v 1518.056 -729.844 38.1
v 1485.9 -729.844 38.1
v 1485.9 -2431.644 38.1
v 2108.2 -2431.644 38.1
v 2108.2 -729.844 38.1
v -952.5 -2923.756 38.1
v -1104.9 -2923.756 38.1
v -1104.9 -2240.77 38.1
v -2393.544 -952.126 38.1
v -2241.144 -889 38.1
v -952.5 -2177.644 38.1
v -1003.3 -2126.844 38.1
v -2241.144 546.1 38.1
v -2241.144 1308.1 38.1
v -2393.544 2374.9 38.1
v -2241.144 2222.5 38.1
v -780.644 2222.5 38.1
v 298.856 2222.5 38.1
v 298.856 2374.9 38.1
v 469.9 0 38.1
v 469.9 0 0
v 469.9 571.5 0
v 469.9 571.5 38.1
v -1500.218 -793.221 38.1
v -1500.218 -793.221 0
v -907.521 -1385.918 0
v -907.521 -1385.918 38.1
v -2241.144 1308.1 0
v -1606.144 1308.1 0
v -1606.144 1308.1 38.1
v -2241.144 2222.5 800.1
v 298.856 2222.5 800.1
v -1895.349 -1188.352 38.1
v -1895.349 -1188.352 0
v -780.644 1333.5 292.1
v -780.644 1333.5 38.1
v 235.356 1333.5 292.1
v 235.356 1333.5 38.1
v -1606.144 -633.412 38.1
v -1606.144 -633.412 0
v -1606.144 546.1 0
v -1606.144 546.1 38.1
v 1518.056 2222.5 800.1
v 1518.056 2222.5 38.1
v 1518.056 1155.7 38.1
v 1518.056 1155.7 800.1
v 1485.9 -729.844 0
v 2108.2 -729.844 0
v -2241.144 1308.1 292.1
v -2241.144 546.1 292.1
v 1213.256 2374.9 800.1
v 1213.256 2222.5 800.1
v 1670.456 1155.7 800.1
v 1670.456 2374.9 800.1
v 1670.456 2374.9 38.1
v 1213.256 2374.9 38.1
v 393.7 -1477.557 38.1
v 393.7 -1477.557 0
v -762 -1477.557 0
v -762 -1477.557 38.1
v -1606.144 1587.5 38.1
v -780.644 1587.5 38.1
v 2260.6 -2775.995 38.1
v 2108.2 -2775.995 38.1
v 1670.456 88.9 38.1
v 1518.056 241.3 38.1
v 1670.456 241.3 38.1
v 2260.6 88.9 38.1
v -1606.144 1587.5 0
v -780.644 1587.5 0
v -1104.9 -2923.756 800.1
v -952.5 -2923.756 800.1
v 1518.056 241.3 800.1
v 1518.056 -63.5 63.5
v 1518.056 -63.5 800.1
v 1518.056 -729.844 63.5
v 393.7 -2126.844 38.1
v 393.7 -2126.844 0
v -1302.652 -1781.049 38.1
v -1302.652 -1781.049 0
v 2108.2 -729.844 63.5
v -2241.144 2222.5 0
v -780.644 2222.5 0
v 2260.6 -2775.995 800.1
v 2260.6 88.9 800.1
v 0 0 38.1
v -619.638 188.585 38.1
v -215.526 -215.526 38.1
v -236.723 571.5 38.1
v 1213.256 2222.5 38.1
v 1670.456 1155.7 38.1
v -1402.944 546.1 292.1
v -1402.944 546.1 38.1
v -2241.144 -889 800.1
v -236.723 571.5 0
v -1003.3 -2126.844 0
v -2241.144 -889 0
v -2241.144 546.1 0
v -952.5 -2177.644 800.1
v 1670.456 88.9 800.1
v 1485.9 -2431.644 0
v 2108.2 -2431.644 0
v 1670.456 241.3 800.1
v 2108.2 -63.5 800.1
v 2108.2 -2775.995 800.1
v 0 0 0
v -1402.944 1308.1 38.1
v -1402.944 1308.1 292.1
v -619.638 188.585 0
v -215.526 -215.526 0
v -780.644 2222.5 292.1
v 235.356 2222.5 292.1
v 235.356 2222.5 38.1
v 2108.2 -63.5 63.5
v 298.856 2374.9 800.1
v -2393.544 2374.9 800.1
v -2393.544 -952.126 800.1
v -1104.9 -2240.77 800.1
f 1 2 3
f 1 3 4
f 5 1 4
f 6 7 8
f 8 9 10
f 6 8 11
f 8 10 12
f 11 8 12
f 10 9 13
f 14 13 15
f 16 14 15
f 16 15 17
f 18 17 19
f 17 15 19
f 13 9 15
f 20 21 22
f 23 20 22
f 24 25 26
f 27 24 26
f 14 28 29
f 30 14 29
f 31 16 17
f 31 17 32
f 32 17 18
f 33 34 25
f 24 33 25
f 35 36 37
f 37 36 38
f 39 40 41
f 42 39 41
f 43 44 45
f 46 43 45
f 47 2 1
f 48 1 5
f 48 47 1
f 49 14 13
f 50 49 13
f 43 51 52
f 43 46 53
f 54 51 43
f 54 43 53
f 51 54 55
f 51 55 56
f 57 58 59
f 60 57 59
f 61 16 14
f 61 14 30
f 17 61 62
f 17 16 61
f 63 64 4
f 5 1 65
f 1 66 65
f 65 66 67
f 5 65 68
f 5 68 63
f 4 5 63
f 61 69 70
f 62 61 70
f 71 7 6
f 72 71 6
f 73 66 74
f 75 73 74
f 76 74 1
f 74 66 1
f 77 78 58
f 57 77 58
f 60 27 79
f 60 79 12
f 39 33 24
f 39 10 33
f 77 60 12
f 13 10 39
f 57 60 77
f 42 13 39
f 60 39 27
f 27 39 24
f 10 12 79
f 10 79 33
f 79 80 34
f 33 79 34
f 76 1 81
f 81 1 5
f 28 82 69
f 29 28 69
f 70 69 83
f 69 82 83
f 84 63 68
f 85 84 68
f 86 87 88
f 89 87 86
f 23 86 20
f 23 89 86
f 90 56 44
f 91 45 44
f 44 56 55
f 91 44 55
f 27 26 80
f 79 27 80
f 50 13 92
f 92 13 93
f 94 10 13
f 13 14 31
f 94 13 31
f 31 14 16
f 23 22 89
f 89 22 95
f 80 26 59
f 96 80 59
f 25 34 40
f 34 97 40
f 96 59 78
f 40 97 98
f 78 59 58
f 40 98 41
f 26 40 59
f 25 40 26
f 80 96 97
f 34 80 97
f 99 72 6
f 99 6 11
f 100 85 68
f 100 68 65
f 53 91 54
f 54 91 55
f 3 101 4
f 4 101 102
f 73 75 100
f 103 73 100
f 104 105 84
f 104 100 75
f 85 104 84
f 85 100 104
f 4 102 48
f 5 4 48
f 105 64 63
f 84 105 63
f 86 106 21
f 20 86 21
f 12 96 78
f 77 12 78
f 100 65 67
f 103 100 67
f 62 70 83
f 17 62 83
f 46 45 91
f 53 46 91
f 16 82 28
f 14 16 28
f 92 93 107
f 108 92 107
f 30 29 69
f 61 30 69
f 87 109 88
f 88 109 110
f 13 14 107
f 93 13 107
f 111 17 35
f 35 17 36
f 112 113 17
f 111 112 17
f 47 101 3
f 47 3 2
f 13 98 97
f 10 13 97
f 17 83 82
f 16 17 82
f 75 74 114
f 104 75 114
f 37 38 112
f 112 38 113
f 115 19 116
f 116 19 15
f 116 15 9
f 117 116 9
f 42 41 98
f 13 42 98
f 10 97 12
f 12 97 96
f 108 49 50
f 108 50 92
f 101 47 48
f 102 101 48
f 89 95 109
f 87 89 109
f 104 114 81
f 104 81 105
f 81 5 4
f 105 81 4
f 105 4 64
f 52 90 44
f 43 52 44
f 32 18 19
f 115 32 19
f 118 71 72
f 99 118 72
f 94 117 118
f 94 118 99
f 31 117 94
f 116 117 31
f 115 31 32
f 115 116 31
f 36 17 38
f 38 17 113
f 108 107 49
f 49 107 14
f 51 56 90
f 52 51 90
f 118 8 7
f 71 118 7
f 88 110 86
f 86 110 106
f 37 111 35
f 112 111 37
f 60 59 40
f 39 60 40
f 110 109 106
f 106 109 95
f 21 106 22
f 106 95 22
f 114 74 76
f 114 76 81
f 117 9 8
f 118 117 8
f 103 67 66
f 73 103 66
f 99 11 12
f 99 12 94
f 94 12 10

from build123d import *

# Parameters (mm, degrees)
F0_W     = 622.3
F0_H     = 1701.8
F1_DEPTH = 38.1
F3_DEPTH = 254
F5_DEPTH = 762
F6_DEPTH = 25.4


with BuildPart() as f1:
    # F0 (on Top) → F1 (new body)
    with BuildSketch(Plane.XY):
        Polygon((-215.526147, -215.526147), (0, 0), (469.9, 0), (469.9, 571.5), (-236.723051, 571.5), (-619.637672, 188.585379), align=None)
        with Locations((1797.05, -1580.744075)):
            Rectangle(F0_W, F0_H)
        Polygon((-2241.144075, 2222.5), (-2241.144075, 1308.1), (-1606.144075, 1308.1), (-1606.144075, 1587.5), (-780.644075, 1587.5), (-780.644075, 2222.5), align=None)
        Polygon((-1003.3, -2126.844075), (393.7, -2126.844075), (393.7, -1477.556575), (-762, -1477.556575), (-1606.144075, -633.4125), (-1606.144075, 546.1), (-2241.144075, 546.1), (-2241.144075, -889), align=None)
        Polygon((-1895.348777, -1188.351873), (-1500.217508, -793.220604), (-907.520604, -1385.917508), (-1302.651873, -1781.048777), align=None, mode=Mode.SUBTRACT)
    extrude(amount=F1_DEPTH)



with BuildPart() as f3:
    # F2 (on face) → F3 (new body)
    with BuildSketch(Plane.XY.offset(38.1)):
        Polygon((235.355925, 2222.5), (-780.644075, 2222.5), (-780.644075, 1587.5), (-780.644075, 1333.5), (235.355925, 1333.5), align=None)
        Polygon((-1606.144075, 1308.1), (-2241.144075, 1308.1), (-2241.144075, 546.1), (-1606.144075, 546.1), (-1402.944075, 546.1), (-1402.944075, 1308.1), align=None)
    extrude(amount=F3_DEPTH)


with BuildPart() as f5:
    # F4 (on face) → F5 (new body)
    with BuildSketch(Plane.XY.offset(38.1)):
        Polygon((-2241.144075, 1308.1), (-2241.144075, 2222.5), (-780.644075, 2222.5), (298.855925, 2222.5), (298.855925, 2374.9), (-2393.544075, 2374.9), (-2393.544075, -952.126147), (-1104.9, -2240.770222), (-1104.9, -2923.756123), (-952.5, -2923.756123), (-952.5, -2177.644075), (-2241.144075, -889), (-2241.144075, 546.1), align=None)
        Polygon((2108.2, -63.5), (2108.2, -425.044075), (2108.2, -729.844075), (2108.2, -2775.994823), (2260.6, -2775.994823), (2260.6, 88.9), (1670.455925, 88.9), (1670.455925, 241.3), (1518.055925, 241.3), (1518.055925, -63.5), align=None)
        Polygon((1670.455925, 2374.9), (1213.255925, 2374.9), (1213.255925, 2222.5), (1518.055925, 2222.5), (1518.055925, 1155.7), (1670.455925, 1155.7), align=None)
    extrude(amount=F5_DEPTH)


with BuildPart() as f1_1:
    add(f1.part)

    add(f5.part)  # F6 merges F5
    # F4 (on face) → F6 (join)
    with BuildSketch(Plane.XY.offset(38.1)):
        Polygon((2108.2, -729.844075), (2108.2, -425.044075), (2108.2, -63.5), (1518.055925, -63.5), (1518.055925, -729.844075), align=None)
    extrude(amount=F6_DEPTH)


solid = Compound([f3.part, f1_1.part])
